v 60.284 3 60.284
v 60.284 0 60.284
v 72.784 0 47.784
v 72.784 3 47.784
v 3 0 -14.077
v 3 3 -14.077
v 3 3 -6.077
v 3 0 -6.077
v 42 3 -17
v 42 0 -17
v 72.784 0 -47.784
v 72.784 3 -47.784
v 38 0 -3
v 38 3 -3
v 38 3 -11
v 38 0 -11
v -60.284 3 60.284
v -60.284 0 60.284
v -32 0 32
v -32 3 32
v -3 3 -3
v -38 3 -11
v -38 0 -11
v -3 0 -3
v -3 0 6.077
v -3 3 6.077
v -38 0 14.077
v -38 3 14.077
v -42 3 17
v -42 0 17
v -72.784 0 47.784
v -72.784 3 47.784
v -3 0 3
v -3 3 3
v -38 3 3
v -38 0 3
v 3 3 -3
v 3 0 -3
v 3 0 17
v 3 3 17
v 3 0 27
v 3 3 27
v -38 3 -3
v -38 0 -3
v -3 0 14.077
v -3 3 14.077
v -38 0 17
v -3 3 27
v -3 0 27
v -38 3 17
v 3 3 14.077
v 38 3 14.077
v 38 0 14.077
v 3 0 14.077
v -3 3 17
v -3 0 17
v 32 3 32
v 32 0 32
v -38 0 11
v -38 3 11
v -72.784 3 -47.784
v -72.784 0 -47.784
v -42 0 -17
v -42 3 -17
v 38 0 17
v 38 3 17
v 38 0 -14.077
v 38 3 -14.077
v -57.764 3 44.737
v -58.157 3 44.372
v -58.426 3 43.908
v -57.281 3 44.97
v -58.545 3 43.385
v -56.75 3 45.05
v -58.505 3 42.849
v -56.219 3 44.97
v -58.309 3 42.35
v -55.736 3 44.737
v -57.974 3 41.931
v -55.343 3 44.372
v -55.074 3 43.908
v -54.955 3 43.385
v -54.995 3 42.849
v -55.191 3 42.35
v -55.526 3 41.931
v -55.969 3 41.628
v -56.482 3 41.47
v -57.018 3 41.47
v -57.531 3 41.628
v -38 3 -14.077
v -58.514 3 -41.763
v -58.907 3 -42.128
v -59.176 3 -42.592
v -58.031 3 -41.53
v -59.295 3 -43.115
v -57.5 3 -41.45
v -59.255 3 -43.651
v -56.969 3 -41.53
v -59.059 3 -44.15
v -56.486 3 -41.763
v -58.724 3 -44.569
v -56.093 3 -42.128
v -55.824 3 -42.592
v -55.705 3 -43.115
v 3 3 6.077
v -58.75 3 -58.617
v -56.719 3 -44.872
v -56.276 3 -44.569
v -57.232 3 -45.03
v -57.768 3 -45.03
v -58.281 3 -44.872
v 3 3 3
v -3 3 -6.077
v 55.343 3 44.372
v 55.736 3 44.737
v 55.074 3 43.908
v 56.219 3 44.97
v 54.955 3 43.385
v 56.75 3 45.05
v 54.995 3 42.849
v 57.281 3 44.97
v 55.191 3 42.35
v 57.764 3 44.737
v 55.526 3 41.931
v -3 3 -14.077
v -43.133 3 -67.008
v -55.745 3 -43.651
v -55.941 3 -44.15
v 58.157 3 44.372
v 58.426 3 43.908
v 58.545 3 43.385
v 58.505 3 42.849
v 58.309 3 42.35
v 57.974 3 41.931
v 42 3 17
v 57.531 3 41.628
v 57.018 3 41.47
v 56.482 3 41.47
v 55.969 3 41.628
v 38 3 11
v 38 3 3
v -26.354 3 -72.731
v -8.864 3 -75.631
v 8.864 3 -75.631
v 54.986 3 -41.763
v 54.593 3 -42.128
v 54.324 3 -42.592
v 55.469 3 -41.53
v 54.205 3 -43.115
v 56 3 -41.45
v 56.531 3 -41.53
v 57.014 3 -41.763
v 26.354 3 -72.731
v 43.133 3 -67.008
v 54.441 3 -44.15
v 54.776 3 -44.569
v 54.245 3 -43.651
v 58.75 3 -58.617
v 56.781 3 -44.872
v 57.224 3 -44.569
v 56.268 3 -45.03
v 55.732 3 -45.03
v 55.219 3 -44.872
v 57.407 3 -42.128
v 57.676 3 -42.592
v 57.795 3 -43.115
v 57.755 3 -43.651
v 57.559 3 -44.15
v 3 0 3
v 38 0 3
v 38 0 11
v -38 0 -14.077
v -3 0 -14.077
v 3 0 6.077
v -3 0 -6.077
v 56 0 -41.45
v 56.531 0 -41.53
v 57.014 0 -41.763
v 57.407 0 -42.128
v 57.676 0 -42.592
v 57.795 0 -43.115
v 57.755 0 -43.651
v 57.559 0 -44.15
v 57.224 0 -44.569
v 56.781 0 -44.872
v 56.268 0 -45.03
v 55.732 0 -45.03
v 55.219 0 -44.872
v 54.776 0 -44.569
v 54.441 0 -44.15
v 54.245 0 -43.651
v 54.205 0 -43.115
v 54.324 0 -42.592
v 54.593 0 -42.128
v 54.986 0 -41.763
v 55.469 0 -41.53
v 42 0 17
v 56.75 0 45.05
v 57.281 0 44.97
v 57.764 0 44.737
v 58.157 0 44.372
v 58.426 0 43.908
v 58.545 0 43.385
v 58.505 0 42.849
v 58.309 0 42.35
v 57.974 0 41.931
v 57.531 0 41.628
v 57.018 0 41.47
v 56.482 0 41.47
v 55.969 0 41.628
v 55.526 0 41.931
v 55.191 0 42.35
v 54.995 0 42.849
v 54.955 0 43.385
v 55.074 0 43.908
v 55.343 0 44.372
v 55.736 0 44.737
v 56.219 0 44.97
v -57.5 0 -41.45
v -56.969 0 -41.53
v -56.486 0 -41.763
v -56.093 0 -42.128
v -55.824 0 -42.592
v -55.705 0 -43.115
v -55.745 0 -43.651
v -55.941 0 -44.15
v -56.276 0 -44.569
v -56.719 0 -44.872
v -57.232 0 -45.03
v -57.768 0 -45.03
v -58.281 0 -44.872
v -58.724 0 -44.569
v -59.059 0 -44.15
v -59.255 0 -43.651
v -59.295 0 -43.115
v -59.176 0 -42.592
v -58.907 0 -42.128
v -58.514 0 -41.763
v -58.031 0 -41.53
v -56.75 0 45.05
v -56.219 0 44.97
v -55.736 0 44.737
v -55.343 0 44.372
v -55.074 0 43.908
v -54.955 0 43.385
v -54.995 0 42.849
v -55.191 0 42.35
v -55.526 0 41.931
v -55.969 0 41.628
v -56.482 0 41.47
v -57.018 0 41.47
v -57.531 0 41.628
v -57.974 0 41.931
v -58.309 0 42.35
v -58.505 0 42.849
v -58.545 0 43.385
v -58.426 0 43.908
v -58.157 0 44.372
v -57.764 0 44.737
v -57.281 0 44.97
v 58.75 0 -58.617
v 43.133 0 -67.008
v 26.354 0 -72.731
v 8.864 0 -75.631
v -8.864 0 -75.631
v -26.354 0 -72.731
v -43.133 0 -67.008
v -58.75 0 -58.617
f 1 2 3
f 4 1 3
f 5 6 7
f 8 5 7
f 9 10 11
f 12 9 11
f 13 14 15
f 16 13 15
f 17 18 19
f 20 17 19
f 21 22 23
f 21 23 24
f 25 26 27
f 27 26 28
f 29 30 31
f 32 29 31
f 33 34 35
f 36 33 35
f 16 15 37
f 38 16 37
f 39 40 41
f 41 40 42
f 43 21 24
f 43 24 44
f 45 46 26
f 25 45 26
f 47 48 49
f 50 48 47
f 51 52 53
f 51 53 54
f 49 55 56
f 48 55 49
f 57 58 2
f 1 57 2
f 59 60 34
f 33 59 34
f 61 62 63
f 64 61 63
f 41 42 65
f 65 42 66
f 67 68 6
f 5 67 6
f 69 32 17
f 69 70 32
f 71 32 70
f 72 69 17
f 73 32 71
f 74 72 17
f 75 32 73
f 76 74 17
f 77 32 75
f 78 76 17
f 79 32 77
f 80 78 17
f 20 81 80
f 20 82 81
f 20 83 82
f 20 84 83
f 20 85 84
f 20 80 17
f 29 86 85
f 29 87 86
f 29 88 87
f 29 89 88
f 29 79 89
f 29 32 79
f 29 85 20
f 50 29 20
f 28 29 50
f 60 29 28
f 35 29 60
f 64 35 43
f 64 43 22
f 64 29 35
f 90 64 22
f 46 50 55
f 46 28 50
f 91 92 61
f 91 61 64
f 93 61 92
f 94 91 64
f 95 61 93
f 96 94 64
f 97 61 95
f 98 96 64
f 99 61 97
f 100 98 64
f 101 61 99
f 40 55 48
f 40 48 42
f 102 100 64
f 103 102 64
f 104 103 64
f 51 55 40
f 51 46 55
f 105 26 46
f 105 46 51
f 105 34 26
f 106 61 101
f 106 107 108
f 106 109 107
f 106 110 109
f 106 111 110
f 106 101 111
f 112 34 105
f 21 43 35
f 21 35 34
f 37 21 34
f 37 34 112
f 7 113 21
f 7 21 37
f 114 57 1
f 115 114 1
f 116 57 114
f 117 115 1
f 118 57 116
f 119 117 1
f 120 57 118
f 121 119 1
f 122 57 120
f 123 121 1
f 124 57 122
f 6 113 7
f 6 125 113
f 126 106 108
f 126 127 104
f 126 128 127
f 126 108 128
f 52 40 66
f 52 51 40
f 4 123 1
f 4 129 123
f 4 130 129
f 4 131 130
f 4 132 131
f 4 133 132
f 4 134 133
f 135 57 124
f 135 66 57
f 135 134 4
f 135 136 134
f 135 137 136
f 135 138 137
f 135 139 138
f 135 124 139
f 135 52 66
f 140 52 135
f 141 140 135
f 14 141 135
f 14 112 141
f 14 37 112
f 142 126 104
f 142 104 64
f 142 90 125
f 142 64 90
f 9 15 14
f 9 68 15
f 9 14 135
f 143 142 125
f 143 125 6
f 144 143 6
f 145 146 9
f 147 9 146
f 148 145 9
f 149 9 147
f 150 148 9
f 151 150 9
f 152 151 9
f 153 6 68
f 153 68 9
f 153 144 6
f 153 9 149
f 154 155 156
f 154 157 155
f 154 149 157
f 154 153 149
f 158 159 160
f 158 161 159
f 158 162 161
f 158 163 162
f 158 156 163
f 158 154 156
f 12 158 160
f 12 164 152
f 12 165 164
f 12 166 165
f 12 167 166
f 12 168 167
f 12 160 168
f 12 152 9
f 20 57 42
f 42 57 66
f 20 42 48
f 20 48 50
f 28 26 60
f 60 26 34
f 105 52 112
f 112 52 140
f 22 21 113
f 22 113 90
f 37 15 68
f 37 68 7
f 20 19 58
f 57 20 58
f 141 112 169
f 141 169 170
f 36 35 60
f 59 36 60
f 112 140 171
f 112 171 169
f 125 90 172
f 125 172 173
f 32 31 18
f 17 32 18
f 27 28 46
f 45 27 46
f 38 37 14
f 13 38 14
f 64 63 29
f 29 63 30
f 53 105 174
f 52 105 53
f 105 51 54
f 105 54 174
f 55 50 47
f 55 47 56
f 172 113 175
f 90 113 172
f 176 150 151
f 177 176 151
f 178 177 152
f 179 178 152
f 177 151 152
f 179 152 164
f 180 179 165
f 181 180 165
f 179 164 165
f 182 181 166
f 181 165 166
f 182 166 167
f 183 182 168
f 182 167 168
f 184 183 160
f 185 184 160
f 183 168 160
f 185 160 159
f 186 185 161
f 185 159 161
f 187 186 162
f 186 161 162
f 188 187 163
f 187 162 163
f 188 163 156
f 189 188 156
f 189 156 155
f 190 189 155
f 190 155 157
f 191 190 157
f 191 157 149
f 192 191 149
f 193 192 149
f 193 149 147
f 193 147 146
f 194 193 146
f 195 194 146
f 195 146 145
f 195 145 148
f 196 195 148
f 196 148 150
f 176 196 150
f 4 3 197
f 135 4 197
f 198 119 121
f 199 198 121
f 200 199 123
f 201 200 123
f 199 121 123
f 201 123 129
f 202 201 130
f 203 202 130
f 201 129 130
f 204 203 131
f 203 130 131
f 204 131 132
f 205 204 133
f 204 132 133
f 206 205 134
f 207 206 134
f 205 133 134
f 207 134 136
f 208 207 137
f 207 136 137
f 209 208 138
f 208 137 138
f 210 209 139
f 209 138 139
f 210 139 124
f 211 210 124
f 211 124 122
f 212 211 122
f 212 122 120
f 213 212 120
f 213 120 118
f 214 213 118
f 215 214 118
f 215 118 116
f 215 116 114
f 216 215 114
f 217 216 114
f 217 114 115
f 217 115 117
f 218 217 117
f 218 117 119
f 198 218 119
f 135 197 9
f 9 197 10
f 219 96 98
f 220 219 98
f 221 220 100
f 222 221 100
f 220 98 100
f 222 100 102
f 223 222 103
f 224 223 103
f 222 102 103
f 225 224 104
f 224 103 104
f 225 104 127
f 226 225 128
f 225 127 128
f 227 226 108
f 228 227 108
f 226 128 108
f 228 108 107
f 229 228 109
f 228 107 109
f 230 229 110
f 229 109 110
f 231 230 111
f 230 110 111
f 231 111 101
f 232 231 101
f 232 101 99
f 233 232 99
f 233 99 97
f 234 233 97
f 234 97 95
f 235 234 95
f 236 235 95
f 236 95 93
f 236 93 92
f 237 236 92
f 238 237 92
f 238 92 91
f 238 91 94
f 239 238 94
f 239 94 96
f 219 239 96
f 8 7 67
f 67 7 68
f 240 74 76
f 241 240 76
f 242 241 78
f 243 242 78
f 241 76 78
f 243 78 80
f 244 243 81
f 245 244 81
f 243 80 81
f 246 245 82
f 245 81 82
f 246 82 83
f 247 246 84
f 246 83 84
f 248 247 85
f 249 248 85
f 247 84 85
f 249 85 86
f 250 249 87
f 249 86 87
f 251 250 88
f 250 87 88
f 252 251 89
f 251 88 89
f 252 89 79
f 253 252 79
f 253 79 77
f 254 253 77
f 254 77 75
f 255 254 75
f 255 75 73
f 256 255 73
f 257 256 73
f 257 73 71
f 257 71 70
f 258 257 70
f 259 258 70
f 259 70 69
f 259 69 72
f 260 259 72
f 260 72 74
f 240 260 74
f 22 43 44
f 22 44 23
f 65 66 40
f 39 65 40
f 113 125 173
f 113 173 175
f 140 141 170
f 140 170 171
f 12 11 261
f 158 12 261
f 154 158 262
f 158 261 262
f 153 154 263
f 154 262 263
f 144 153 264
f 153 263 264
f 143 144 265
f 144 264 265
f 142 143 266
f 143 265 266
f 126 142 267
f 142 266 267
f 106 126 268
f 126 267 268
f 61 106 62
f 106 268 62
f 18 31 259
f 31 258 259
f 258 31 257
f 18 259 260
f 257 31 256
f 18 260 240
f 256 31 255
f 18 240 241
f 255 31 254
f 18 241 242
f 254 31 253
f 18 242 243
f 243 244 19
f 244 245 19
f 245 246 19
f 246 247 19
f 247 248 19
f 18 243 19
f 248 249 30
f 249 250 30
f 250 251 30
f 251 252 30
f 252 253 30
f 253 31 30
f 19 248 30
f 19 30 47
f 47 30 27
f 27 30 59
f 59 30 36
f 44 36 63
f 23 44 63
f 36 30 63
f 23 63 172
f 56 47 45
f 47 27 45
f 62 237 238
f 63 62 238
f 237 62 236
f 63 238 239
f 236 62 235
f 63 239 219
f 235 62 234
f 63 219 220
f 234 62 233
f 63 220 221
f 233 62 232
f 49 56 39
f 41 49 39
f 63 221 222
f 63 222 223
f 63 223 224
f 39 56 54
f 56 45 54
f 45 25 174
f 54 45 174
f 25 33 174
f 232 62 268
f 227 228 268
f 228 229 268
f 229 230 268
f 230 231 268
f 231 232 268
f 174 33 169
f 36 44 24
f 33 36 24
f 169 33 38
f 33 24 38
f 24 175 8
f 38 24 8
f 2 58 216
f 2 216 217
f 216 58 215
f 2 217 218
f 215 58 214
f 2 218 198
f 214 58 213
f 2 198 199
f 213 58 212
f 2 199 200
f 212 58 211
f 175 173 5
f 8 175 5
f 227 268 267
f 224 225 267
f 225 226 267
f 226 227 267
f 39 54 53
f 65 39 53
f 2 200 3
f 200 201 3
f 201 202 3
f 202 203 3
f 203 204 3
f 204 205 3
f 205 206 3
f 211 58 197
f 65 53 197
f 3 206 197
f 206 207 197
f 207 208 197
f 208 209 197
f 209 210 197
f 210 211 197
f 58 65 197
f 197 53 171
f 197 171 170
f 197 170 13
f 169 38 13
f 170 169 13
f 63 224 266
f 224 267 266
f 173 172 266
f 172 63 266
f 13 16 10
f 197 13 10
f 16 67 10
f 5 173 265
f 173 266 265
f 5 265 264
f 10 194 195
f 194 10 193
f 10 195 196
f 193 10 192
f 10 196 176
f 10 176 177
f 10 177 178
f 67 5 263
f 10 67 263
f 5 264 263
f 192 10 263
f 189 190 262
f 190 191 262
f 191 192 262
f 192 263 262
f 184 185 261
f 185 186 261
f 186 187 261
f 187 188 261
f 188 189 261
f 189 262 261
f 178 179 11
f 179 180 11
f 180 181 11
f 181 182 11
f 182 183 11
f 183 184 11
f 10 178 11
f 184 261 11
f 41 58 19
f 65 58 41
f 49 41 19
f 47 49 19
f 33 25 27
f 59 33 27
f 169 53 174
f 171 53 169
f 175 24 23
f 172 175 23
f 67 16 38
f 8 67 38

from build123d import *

# Parameters (mm, degrees)
BOSS_EXTRUDE1_DEPTH = 3
SKETCH5_R           = 1.8
CUT_EXTRUDE2_DEPTH  = 106.270616959
CUT_EXTRUDE3_DEPTH  = 106.270616959


with BuildPart() as part:
    # Sketch2 → Boss-Extrude1 (new body)
    with BuildSketch(Plane(origin=(0, 0, 0), x_dir=(1, 0, 0), z_dir=(0, 1, 0))):
        with BuildLine():
            Line((-42, 17), (-42, -17))
            Line((-42, -17), (-72.784271247, -47.784271247))
            Line((-72.784271247, -47.784271247), (-60.284271247, -60.284271247))
            Line((-60.284271247, -60.284271247), (-32, -32))
            Line((-32, -32), (32, -32))
            Line((32, -32), (60.284271247, -60.284271247))
            Line((60.284271247, -60.284271247), (72.784271247, -47.784271247))
            Line((72.784271247, -47.784271247), (42, -17))
            Line((42, -17), (42, 17))
            Line((42, 17), (72.784271247, 47.784271247))
            ThreePointArc((72.784271247, 47.784271247), (0, 75.995741025), (-72.784271247, 47.784271247))
            Line((-72.784271247, 47.784271247), (-42, 17))
        make_face()
    extrude(amount=BOSS_EXTRUDE1_DEPTH)

    # Sketch5 → Cut-Extrude2 (cut, through all)
    with BuildSketch(Plane(origin=(0, 3, 0), x_dir=(1, 0, 0), z_dir=(0, 1, 0))):
        with Locations(Location((-57.5, 43.25, 0), (0, 0, 270))):
            Circle(SKETCH5_R)
        with Locations(Location((56, 43.25, 0), (0, 0, 270))):
            Circle(SKETCH5_R)
        with Locations(Location((56.75, -43.25, 0), (0, 0, 270))):
            Circle(SKETCH5_R)
        with Locations(Location((-56.75, -43.25, 0), (0, 0, 270))):
            Circle(SKETCH5_R)
    extrude(amount=-CUT_EXTRUDE2_DEPTH, mode=Mode.SUBTRACT)

    # Sketch6 → Cut-Extrude3 (cut, through all)
    with BuildSketch(Plane(origin=(0, 3, 0), x_dir=(1, 0, 0), z_dir=(0, 1, 0))):
        Polygon((-38, 14.077369669), (-3, 14.077369669), (-3, 6.077369669), align=None)
        Polygon((-38, 11), (-3, 3), (-38, 3), align=None)
        Polygon((-3, -14.077369669), (-3, -6.077369669), (-38, -14.077369669), align=None)
        Polygon((-3, -3), (-38, -3), (-38, -11), align=None)
        Polygon((38, -14.077369669), (3, -14.077369669), (3, -6.077369669), align=None)
        Polygon((38, -11), (3, -3), (38, -3), align=None)
        Polygon((3, 3), (38, 3), (38, 11), align=None)
        Polygon((3, 14.077369669), (3, 6.077369669), (38, 14.077369669), align=None)
        Polygon((-38, -17), (-3, -17), (-3, -27), align=None)
        Polygon((3, -17), (3, -27), (38, -17), align=None)
    extrude(amount=-CUT_EXTRUDE3_DEPTH, mode=Mode.SUBTRACT)


solid = part.part
